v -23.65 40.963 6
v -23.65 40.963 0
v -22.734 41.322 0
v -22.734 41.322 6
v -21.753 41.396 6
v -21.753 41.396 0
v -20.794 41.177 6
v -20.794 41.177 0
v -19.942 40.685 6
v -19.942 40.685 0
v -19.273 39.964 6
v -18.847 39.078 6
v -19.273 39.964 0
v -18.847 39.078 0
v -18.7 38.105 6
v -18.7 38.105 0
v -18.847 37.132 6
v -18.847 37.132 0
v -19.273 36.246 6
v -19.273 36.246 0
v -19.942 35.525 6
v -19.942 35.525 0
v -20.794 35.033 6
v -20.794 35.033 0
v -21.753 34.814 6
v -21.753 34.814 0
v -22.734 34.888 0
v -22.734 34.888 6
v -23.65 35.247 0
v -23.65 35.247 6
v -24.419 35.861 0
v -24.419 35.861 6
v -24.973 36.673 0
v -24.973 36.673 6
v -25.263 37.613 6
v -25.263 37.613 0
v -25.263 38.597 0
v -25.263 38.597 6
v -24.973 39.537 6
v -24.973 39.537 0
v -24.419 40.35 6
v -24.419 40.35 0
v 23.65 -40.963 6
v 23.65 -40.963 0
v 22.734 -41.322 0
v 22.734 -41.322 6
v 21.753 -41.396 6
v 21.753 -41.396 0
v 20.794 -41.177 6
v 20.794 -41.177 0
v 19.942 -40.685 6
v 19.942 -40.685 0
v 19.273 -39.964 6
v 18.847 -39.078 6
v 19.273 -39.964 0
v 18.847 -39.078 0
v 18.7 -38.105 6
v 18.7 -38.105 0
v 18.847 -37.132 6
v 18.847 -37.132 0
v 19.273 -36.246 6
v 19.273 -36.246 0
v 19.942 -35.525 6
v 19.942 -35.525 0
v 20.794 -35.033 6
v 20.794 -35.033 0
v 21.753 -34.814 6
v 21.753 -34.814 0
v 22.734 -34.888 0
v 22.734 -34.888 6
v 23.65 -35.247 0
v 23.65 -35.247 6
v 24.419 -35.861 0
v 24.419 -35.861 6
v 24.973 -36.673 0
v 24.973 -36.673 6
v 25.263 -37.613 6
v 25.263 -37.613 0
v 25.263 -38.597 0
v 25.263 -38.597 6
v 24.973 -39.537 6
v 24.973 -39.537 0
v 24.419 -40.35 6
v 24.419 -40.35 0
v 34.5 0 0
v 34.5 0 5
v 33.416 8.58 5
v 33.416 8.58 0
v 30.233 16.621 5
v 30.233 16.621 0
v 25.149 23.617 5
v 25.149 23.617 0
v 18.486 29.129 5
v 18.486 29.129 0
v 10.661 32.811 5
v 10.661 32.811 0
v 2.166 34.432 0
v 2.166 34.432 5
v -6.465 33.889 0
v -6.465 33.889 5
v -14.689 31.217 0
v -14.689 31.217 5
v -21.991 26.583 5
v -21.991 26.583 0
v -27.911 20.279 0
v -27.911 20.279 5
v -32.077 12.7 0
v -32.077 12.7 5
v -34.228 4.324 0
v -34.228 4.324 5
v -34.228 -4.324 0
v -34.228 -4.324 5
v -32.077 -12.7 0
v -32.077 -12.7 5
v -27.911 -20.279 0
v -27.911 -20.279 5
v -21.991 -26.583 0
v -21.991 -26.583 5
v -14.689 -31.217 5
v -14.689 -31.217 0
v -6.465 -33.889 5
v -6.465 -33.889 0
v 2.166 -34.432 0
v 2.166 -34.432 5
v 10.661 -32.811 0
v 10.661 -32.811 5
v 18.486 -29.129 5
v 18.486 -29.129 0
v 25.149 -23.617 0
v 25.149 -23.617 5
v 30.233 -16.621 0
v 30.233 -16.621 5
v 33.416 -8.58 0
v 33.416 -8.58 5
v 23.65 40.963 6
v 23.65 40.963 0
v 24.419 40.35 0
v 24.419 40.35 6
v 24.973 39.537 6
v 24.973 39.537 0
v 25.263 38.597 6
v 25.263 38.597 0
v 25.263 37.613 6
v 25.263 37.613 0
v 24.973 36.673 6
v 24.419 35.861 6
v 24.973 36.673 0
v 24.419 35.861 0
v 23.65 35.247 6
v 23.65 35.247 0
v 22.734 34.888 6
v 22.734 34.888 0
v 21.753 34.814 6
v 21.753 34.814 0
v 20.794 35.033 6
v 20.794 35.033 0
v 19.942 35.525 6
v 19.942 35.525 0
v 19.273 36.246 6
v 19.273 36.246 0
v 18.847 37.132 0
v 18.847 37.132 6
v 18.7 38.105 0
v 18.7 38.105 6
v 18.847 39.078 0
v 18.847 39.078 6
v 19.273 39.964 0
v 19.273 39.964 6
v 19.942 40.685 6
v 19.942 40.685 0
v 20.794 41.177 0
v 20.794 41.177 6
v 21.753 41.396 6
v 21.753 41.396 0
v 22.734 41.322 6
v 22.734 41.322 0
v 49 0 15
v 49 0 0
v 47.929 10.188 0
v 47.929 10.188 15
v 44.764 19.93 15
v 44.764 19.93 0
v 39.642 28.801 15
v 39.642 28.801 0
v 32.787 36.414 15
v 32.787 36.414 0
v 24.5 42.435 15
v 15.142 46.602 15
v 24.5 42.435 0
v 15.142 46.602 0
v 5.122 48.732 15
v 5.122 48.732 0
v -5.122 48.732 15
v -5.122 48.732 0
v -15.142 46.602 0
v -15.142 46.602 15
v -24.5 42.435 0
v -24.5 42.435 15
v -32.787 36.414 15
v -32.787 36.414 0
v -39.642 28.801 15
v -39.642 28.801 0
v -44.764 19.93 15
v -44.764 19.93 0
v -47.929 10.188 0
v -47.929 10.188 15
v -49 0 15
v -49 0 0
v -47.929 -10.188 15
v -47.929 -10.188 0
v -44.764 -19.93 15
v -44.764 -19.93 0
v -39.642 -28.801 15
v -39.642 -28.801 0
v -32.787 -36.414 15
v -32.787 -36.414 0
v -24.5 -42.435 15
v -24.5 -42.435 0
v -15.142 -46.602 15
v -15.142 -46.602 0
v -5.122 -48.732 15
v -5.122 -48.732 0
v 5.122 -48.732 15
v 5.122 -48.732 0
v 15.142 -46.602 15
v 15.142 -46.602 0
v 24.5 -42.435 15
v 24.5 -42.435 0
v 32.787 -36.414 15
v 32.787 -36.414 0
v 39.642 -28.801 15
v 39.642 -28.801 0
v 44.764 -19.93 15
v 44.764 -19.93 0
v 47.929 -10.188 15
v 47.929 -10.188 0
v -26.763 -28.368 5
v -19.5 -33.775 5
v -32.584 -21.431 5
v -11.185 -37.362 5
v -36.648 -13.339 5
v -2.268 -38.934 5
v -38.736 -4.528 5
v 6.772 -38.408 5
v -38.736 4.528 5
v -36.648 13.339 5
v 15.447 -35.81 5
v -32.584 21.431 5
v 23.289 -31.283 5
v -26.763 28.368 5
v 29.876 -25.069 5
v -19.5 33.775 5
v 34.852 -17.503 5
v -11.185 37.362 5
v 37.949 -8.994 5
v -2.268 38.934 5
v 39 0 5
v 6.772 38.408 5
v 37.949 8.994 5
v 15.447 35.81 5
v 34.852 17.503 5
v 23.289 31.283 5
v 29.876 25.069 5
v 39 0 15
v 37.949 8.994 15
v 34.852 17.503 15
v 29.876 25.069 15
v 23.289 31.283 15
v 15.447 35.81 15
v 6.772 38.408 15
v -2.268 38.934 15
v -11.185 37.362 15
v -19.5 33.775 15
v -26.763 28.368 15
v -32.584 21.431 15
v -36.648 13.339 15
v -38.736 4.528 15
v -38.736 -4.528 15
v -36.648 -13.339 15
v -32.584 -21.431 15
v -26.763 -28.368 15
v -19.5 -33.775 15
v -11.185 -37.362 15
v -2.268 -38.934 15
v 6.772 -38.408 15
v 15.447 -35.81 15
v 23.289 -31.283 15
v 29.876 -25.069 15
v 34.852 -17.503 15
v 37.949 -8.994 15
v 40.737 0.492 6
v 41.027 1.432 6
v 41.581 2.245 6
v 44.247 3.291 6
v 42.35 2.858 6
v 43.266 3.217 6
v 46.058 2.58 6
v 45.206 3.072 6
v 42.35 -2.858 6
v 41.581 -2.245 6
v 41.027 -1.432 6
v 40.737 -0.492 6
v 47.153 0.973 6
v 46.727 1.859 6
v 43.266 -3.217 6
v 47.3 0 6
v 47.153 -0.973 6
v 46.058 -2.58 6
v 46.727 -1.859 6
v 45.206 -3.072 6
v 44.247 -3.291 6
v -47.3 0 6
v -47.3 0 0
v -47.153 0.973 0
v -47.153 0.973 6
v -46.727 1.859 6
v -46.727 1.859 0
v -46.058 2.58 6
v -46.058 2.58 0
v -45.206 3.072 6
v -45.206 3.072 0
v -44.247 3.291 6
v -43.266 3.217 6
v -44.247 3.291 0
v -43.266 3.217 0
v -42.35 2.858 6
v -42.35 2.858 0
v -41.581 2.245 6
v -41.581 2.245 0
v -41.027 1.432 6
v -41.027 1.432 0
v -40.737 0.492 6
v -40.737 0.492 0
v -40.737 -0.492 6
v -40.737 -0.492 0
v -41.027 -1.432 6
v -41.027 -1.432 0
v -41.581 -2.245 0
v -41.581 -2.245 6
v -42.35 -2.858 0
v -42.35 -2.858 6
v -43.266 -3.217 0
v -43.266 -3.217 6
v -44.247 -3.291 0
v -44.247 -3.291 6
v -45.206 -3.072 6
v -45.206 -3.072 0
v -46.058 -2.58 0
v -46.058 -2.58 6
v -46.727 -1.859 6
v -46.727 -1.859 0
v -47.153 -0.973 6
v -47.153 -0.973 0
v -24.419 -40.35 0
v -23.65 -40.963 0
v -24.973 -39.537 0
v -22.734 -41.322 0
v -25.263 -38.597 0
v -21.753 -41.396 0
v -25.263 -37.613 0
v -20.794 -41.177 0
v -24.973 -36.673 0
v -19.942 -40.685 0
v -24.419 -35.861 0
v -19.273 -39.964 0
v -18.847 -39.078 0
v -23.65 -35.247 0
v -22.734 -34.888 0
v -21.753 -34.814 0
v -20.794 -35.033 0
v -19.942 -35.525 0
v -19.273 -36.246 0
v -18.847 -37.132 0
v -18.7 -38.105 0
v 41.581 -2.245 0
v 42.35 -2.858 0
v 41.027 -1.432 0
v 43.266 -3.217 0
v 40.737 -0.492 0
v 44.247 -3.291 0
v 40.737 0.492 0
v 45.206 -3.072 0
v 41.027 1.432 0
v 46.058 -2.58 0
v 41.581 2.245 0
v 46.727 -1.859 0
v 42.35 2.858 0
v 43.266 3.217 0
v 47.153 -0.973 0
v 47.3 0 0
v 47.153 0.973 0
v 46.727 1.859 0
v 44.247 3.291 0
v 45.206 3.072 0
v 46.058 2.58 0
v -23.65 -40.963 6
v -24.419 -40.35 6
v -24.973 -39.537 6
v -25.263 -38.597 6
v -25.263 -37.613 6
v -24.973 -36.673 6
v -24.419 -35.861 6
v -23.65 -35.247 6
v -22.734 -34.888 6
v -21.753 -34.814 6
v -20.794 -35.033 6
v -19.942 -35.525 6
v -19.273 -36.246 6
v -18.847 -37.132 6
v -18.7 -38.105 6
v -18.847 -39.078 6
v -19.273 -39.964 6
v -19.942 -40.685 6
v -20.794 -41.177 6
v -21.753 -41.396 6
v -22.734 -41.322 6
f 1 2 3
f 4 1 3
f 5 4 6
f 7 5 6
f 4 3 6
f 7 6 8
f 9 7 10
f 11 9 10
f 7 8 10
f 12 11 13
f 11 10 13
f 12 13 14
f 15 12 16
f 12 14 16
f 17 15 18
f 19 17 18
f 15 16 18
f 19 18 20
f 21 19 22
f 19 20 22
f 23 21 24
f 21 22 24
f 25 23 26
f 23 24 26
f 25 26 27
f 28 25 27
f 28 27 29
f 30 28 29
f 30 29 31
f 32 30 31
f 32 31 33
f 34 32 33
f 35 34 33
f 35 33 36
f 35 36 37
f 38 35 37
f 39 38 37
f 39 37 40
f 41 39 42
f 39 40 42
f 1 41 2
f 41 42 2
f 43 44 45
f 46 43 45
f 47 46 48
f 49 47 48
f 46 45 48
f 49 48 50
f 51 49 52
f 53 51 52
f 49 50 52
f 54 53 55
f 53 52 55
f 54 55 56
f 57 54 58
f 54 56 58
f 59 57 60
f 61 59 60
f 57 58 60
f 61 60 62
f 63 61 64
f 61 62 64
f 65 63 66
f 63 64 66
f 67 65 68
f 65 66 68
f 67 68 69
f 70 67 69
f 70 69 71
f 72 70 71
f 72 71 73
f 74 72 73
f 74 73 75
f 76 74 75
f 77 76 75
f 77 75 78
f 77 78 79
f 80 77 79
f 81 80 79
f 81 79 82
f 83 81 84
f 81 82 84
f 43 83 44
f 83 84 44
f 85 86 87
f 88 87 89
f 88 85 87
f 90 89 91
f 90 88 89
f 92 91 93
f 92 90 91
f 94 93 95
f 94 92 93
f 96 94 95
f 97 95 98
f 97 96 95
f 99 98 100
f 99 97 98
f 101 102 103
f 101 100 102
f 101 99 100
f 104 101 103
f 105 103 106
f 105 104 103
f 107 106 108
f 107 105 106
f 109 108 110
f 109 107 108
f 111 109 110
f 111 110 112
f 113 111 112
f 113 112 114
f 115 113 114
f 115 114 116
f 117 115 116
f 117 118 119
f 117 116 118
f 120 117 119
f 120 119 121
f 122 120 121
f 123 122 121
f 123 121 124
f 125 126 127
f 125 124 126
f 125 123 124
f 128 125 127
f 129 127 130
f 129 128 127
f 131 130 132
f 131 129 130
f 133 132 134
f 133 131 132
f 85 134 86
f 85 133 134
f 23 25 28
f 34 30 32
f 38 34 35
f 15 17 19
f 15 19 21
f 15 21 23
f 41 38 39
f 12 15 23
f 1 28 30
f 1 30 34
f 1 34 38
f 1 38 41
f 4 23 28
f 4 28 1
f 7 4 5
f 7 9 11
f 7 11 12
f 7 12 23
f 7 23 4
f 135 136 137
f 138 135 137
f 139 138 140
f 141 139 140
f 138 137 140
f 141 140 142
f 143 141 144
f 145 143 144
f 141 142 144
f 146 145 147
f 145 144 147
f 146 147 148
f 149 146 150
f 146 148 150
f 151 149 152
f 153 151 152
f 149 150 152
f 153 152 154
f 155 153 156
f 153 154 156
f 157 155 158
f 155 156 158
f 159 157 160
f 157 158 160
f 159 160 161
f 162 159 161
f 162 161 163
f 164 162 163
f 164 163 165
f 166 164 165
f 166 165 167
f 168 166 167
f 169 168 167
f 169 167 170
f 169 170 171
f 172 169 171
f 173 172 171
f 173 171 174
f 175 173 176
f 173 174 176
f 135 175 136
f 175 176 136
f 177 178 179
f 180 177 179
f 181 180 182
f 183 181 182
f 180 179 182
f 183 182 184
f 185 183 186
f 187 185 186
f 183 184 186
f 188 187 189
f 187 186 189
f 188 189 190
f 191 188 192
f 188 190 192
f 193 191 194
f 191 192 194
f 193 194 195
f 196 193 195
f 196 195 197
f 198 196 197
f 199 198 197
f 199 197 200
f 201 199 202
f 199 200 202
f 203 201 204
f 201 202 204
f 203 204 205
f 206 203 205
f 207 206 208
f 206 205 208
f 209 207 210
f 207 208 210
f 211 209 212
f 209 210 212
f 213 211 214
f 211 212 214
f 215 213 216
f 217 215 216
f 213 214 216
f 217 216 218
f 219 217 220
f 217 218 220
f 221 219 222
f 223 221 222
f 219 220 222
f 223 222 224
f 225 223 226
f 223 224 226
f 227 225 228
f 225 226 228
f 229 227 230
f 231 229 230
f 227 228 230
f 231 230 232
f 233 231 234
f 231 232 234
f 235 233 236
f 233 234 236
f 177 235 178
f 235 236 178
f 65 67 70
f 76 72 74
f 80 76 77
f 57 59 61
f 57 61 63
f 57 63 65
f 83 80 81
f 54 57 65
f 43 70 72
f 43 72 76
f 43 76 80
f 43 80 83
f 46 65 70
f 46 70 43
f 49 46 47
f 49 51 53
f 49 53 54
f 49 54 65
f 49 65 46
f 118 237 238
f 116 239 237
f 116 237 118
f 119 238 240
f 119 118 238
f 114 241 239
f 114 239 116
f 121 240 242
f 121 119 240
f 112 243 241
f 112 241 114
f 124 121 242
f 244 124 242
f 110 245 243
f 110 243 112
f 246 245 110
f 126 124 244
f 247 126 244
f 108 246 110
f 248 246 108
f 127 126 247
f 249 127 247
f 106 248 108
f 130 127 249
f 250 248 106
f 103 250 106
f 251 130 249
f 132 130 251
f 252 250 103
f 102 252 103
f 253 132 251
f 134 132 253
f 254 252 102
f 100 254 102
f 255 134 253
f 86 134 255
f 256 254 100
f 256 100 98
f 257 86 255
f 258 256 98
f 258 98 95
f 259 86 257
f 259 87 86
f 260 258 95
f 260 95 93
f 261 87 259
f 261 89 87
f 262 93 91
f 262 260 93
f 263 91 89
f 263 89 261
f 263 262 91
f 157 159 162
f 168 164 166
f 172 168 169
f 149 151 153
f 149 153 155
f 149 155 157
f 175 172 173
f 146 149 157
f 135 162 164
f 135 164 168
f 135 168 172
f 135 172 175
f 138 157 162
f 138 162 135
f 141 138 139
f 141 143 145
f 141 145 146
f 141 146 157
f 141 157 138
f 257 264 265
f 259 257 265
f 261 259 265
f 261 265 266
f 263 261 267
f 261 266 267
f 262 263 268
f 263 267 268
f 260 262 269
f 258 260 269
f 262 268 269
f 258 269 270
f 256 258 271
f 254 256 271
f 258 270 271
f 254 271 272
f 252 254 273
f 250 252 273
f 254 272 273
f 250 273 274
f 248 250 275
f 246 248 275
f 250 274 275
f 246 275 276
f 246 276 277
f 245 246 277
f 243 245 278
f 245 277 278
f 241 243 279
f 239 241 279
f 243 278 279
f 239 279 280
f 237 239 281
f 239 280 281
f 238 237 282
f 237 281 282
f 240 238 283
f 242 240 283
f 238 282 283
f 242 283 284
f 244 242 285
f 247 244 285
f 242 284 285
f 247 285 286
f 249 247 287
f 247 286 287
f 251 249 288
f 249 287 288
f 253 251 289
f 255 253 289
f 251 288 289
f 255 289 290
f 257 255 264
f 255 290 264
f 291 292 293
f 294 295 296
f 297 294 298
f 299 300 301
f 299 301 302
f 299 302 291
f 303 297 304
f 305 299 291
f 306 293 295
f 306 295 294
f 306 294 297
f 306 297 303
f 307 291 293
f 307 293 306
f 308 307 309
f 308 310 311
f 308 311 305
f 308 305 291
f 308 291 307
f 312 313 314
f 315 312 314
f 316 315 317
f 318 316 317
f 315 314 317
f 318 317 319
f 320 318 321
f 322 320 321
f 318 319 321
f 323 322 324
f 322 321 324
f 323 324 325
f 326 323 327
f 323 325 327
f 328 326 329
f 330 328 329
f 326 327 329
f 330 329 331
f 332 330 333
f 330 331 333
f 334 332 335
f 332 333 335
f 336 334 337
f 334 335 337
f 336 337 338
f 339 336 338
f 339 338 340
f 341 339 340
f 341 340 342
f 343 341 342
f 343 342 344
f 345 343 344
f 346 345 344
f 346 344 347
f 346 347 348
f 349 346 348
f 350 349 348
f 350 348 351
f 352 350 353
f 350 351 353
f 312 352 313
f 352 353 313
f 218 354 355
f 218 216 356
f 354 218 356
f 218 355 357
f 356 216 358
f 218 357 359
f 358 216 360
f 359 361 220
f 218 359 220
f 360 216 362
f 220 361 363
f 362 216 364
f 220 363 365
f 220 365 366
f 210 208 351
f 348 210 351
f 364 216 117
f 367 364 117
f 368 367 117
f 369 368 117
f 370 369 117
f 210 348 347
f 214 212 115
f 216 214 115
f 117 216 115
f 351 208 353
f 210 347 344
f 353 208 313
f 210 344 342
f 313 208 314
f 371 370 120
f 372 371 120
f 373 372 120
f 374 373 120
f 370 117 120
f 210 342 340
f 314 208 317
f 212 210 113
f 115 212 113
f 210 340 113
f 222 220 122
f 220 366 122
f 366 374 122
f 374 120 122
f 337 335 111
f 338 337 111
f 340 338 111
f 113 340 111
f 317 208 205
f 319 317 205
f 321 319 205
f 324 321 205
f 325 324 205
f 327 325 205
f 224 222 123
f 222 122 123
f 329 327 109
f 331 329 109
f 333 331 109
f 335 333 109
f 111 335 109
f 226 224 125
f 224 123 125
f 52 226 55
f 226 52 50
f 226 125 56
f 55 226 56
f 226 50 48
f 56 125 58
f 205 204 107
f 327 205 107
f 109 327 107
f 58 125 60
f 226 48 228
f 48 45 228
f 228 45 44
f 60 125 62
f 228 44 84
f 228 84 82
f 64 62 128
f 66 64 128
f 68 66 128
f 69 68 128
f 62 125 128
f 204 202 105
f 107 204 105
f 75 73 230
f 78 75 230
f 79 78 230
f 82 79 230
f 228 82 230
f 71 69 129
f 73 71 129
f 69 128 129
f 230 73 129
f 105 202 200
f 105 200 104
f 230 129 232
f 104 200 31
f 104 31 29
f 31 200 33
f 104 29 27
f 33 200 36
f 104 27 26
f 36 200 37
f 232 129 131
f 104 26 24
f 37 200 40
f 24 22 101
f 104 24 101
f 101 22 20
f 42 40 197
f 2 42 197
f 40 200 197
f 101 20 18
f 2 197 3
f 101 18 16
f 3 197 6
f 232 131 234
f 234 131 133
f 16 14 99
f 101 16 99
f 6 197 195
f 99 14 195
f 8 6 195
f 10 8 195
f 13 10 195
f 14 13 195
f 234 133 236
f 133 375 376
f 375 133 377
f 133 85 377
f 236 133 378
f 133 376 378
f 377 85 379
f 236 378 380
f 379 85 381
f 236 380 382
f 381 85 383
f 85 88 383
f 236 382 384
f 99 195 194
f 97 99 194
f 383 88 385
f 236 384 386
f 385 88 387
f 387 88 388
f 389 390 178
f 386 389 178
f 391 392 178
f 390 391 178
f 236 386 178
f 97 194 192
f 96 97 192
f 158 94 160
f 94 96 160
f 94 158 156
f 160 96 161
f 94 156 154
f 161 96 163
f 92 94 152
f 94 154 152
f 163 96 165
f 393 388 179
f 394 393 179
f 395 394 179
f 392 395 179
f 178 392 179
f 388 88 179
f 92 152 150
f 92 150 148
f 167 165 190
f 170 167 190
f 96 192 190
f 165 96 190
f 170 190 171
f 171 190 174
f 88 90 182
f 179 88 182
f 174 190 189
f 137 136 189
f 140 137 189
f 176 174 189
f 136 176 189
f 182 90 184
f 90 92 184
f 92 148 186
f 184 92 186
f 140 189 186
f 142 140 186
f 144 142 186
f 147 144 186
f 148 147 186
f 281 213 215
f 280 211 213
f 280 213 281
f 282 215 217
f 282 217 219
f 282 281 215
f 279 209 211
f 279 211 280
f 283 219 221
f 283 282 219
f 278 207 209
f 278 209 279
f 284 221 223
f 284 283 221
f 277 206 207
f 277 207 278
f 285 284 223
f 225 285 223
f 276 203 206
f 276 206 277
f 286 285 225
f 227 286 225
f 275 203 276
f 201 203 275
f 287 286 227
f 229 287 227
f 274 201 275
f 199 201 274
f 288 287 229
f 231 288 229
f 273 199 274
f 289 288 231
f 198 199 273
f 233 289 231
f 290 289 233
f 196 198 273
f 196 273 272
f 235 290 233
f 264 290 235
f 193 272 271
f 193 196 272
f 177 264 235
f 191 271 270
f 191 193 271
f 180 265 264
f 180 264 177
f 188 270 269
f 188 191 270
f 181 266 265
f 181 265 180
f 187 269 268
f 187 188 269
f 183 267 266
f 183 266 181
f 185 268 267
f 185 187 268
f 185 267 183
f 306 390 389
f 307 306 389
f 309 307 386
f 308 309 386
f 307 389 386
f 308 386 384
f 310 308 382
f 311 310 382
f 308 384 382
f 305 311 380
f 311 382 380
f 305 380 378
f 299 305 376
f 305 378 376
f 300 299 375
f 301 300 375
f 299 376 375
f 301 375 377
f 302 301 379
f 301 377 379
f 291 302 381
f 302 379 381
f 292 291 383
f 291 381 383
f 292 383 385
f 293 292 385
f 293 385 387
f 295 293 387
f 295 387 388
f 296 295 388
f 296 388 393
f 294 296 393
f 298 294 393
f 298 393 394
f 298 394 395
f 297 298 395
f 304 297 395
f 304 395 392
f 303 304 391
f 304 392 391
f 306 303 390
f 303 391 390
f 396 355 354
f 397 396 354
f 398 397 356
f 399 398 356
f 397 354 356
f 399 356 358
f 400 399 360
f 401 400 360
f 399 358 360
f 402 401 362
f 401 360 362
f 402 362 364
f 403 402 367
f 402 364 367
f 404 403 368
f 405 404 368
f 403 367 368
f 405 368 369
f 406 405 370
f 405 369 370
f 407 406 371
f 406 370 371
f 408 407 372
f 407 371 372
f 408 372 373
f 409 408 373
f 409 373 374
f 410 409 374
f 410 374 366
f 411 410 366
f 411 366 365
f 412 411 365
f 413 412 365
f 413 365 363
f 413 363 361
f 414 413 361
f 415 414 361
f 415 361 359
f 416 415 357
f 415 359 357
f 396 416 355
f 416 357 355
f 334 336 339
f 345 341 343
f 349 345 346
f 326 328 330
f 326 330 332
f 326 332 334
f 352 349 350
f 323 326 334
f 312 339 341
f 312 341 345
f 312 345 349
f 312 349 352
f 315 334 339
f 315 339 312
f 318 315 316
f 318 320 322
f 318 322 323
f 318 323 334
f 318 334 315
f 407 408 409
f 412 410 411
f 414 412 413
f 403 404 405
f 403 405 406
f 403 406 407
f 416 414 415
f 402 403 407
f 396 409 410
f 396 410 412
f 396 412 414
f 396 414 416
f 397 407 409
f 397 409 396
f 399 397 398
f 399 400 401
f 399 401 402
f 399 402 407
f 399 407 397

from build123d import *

# Parameters (mm, degrees)
SZKIC1_R                    = 49
SZKIC1_R_2                  = 34.5
DODANIE_WYCI_GNI_CIE1_DEPTH = 15
SZKIC2_R                    = 3.3
WYTNIJ_WYCI_GNI_CIE1_DEPTH  = 6
SZYK_KO_OWY1_COUNT          = 6
SZKIC3_R                    = 39
WYTNIJ_WYCI_GNI_CIE2_DEPTH  = 10


with BuildPart() as part:
    # Szkic1 → Dodanie-wyciągnięcie1 (new body)
    with BuildSketch(Plane.XY):
        Circle(SZKIC1_R)
        Circle(SZKIC1_R_2, mode=Mode.SUBTRACT)
    extrude(amount=DODANIE_WYCI_GNI_CIE1_DEPTH)

    # Szkic2 → Wytnij-wyciągnięcie1 (cut)
    with BuildSketch(Plane(origin=(0, 0, 0), x_dir=(-1, 0, 0), z_dir=(0, 0, -1))):
        with Locations((44, 0)):
            Circle(SZKIC2_R)
    wytnij_wyci_gni_cie1 = extrude(amount=-WYTNIJ_WYCI_GNI_CIE1_DEPTH, mode=Mode.SUBTRACT)

    # Szyk kołowy1: Wytnij-wyciągnięcie1 ×6 about axis
    szyk_ko_owy1_axis = Axis((0, 0, 0), (0, 0, 1))
    for i in range(1, SZYK_KO_OWY1_COUNT):
        add(wytnij_wyci_gni_cie1.rotate(szyk_ko_owy1_axis, i * 360 / SZYK_KO_OWY1_COUNT), mode=Mode.SUBTRACT)

    # Szkic3 → Wytnij-wyciągnięcie2 (cut)
    with BuildSketch(Plane.XY.offset(15)):
        Circle(SZKIC3_R)
    extrude(amount=-WYTNIJ_WYCI_GNI_CIE2_DEPTH, mode=Mode.SUBTRACT)


solid = part.part
